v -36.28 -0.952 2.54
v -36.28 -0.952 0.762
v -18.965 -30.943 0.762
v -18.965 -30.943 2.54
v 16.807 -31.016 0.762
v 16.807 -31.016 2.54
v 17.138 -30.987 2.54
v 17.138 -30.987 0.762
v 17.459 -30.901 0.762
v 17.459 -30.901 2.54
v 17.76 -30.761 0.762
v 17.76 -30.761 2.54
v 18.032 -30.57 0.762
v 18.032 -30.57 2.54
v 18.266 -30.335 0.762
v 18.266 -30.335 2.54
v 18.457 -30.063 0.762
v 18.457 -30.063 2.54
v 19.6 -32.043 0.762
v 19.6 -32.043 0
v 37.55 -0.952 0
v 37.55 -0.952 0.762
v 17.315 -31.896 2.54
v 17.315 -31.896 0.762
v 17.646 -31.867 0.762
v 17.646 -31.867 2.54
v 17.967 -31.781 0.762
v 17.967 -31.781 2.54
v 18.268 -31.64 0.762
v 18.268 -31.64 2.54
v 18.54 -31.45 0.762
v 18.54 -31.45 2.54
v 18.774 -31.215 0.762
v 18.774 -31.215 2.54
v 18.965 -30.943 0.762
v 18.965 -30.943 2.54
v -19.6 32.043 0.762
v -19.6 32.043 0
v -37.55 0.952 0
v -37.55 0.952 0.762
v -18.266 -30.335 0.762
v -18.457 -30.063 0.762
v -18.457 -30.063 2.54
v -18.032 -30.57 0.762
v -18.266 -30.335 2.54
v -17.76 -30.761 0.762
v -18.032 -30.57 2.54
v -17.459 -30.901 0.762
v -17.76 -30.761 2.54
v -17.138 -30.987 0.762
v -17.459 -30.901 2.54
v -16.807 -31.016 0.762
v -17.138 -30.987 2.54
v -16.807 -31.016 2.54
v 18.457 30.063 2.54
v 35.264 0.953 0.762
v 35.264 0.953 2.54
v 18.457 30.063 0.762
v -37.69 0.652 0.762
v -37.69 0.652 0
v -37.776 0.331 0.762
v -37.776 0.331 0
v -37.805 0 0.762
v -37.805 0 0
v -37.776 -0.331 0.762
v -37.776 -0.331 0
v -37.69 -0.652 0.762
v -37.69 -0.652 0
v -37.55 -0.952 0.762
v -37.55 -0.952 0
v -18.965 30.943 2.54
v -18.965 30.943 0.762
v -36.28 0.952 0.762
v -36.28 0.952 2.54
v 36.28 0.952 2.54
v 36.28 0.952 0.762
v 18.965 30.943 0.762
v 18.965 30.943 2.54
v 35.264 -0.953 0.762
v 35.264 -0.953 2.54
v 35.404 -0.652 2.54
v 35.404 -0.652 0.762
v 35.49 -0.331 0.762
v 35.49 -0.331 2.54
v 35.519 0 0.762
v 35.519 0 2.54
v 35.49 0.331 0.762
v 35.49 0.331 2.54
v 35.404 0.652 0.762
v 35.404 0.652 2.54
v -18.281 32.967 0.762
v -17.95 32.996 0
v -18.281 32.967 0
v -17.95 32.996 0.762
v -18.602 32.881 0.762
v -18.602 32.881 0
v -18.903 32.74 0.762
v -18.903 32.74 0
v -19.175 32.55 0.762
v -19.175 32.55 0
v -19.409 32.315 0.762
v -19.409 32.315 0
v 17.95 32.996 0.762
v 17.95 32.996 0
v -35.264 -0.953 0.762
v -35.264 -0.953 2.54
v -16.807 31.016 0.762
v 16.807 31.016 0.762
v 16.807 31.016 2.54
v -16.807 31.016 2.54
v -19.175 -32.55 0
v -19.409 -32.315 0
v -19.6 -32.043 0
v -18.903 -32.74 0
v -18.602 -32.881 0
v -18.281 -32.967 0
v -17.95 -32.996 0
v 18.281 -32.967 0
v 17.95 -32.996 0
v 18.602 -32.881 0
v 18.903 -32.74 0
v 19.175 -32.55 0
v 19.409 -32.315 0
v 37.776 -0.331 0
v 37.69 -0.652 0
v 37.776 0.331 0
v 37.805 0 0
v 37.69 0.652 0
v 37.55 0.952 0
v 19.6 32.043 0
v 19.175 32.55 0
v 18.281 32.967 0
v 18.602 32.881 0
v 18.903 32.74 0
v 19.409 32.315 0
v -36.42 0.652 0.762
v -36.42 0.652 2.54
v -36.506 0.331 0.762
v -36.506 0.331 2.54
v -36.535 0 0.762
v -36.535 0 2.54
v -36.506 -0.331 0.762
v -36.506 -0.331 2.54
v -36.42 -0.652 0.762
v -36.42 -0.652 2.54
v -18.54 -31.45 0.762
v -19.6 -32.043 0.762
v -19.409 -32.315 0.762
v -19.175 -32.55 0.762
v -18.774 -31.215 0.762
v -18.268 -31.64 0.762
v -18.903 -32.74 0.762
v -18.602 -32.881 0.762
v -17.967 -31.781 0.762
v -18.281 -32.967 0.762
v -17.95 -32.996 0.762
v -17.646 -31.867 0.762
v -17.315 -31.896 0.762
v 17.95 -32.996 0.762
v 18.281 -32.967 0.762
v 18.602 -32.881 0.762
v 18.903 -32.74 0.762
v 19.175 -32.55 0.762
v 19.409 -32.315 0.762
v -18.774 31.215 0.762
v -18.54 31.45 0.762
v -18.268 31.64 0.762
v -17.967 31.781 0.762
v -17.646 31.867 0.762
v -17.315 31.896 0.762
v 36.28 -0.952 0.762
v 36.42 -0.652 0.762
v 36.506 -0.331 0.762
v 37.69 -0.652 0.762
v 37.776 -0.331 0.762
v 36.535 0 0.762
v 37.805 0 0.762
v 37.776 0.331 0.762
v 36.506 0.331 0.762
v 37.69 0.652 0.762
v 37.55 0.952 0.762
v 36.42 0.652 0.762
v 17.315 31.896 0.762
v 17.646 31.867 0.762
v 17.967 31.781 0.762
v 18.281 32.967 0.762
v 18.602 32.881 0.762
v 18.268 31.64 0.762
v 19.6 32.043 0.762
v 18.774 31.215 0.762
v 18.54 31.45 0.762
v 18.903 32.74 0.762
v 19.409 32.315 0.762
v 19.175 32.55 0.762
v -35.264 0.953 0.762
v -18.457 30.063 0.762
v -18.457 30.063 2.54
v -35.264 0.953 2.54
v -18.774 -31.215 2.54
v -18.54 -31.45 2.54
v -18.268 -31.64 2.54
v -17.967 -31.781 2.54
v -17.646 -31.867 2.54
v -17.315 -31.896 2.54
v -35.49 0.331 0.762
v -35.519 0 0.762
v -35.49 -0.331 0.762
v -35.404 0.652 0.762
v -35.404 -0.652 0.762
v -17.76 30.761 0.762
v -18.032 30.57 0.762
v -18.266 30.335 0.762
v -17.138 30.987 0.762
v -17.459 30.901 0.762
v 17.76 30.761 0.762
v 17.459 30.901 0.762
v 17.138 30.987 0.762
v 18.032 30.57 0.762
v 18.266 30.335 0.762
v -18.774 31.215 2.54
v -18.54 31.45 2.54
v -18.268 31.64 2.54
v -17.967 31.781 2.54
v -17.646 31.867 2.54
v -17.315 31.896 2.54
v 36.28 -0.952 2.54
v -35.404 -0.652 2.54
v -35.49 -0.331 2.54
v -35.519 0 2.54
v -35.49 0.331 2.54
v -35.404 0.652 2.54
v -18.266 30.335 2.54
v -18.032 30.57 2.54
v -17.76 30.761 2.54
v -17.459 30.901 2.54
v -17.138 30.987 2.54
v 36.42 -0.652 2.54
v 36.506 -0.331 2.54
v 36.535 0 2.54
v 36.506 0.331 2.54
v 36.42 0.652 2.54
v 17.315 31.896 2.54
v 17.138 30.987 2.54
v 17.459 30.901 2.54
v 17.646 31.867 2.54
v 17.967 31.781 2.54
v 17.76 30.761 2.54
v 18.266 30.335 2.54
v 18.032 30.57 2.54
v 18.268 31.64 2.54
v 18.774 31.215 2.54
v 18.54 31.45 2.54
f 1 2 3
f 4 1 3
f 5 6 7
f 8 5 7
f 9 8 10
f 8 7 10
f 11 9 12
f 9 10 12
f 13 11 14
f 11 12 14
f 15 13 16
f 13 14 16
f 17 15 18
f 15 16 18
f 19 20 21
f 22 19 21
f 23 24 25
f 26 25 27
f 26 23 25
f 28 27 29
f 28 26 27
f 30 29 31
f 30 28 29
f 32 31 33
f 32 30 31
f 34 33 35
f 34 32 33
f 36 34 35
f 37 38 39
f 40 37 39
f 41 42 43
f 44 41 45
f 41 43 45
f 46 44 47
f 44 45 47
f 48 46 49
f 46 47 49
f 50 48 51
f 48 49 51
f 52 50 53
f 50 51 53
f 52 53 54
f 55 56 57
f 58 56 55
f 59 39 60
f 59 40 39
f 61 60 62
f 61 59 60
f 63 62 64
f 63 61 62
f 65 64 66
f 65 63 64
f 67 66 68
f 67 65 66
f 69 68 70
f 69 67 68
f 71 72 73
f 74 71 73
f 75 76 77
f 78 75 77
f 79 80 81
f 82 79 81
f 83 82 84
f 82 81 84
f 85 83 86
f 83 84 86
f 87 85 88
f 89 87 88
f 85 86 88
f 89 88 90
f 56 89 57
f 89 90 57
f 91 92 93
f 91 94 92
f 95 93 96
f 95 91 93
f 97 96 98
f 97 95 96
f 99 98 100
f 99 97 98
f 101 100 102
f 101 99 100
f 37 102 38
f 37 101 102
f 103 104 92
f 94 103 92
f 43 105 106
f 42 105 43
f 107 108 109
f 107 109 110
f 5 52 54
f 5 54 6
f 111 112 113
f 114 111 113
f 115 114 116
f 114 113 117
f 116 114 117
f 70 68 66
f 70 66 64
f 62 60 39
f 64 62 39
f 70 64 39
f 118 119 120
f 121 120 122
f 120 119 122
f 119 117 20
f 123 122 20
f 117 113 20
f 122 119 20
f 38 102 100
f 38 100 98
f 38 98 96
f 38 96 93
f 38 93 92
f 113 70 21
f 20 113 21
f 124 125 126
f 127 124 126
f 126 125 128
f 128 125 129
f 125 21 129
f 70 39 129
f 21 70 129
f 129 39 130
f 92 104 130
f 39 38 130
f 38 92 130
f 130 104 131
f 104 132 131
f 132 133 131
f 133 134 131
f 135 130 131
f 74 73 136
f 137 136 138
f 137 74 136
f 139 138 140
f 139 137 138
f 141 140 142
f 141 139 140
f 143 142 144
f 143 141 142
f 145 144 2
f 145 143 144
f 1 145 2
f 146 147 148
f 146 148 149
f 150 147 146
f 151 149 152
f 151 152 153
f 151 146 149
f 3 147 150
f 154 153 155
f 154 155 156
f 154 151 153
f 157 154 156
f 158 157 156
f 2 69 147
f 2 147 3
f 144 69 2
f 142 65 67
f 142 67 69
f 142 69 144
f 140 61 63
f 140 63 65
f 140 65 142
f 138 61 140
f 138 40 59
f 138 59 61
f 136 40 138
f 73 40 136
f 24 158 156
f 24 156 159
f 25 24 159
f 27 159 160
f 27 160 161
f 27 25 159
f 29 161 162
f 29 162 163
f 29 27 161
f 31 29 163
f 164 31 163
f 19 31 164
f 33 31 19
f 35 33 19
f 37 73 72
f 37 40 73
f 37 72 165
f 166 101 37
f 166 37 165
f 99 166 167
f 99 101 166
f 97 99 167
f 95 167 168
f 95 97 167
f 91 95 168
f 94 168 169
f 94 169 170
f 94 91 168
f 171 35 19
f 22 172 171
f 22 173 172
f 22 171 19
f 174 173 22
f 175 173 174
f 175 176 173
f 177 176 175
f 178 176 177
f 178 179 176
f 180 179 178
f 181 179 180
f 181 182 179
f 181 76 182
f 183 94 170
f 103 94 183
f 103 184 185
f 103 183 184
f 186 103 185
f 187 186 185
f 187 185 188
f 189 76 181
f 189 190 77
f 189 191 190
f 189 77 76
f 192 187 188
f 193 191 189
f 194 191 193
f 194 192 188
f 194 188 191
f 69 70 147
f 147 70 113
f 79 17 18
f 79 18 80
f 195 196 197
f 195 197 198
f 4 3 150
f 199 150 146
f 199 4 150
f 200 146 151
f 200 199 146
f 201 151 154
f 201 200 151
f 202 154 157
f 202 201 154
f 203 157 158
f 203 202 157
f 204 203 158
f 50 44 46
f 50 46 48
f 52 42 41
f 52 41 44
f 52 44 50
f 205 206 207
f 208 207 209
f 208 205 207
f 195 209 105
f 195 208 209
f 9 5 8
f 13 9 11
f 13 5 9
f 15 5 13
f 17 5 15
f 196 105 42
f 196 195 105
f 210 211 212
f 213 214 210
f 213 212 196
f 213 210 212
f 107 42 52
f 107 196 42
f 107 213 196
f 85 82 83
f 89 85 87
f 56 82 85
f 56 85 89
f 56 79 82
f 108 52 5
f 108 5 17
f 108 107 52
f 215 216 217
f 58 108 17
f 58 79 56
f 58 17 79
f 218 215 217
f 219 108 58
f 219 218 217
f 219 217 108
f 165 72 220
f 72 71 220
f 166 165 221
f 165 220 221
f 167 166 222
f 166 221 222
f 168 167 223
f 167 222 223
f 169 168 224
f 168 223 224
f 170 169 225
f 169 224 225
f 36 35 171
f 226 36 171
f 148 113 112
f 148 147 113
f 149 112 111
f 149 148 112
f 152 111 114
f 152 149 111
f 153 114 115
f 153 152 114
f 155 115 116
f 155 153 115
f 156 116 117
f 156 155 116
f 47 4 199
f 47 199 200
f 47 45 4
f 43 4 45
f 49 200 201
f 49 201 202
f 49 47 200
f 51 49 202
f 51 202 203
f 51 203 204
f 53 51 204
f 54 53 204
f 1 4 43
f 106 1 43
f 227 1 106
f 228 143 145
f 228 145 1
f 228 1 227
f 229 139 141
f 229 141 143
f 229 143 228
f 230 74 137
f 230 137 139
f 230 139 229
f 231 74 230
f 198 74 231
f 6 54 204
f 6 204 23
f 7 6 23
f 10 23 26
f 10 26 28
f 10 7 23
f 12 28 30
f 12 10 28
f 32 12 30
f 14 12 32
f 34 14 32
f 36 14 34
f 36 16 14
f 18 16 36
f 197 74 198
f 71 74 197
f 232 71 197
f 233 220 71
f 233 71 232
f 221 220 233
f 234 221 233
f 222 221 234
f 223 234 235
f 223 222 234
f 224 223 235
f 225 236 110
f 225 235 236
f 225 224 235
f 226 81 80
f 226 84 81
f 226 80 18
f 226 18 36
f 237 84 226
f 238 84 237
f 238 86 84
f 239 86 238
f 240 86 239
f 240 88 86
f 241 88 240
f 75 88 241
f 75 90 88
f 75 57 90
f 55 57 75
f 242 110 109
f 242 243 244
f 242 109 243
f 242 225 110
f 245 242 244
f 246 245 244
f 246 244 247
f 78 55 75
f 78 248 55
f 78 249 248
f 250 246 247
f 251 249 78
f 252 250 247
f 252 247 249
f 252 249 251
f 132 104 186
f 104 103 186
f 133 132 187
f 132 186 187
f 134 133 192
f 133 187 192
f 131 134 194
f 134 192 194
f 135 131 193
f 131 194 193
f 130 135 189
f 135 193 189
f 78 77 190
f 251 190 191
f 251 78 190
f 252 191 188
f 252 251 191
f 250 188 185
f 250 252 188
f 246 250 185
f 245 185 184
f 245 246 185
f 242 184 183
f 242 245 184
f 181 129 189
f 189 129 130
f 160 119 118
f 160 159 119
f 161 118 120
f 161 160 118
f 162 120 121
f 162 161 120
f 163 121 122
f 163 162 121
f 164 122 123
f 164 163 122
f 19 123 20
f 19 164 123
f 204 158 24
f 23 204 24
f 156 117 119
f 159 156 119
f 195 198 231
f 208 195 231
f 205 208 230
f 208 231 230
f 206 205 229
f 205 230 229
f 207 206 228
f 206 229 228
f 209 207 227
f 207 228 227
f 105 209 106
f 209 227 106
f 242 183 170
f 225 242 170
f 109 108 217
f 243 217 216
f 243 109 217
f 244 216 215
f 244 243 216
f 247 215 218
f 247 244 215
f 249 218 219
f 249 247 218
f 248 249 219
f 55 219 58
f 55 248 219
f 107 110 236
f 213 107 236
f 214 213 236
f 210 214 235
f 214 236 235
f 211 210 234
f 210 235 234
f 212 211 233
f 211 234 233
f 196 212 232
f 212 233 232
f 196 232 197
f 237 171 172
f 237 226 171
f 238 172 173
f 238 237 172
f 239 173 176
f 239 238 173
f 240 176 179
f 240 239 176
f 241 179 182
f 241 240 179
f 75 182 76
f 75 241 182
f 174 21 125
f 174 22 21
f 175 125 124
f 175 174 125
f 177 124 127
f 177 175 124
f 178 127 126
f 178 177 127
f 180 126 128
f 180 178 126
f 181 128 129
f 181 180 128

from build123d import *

# Parameters (mm, degrees)
F1_DEPTH = 0.762
F2_R     = 1.905
F4_DEPTH = 2.54
F5_R     = 1.905
F7_DEPTH = 2.54
F8_R     = 1.905


with BuildPart() as f1:
    # F0 (on Top) → F1 (new body)
    with BuildSketch(Plane.XY):
        Polygon((19.05, 32.9955678842), (-19.05, 32.9955678842), (-38.1, 0), (-19.05, -32.9955678842), (19.05, -32.9955678842), (38.1, 0), align=None)
    extrude(amount=F1_DEPTH)

    # F2
    f2_edges = [f1.edges().sort_by_distance(p)[0] for p in [
        (38.1, 0, 0.381),
        (19.05, 32.995568, 0.381),
        (-19.05, 32.995568, 0.381),
        (-38.1, 0, 0.381),
        (-19.05, -32.995568, 0.381),
        (19.05, -32.995568, 0.381),
    ]]
    fillet(f2_edges, radius=F2_R)

    # F3 (on Top) → F4 (join)
    with BuildSketch(Plane.XY):
        Polygon((18.415, 31.8957156214), (-18.415, 31.8957156214), (-36.83, 0), (-18.415, -31.8957156214), (18.415, -31.8957156214), (36.83, 0), align=None)
    extrude(amount=F4_DEPTH)

    # F5
    f5_edges = [f1.edges().sort_by_distance(p)[0] for p in [
        (-18.415, -31.895716, 1.651),
        (18.415, -31.895716, 1.651),
        (36.83, 0, 1.651),
        (-36.83, 0, 1.651),
        (18.415, 31.895716, 1.651),
        (-18.415, 31.895716, 1.651),
    ]]
    fillet(f5_edges, radius=F5_R)


with BuildPart() as f7:
    # F6 (on Top) → F7 (new body)
    with BuildSketch(Plane.XY):
        Polygon((17.907, 31.0158338111), (-17.907, 31.0158338111), (-35.814, 0), (-17.907, -31.0158338111), (17.907, -31.0158338111), (35.814, 0), align=None)
    extrude(amount=F7_DEPTH)

    # F8
    f8_edges = [f7.edges().sort_by_distance(p)[0] for p in [
        (-17.907, -31.015834, 1.27),
        (17.907, -31.015834, 1.27),
        (35.814, 0, 1.27),
        (-35.814, 0, 1.27),
        (17.907, 31.015834, 1.27),
        (-17.907, 31.015834, 1.27),
    ]]
    fillet(f8_edges, radius=F8_R)


with BuildPart() as f7_1:
    # F9: moved
    add(f7.part.moved(Location((0, 0, 0.762))))


with BuildPart() as f1_1:
    add(f1.part)

    # F10: cut F7
    add(f7_1.part, mode=Mode.SUBTRACT)


solid = f1_1.part
